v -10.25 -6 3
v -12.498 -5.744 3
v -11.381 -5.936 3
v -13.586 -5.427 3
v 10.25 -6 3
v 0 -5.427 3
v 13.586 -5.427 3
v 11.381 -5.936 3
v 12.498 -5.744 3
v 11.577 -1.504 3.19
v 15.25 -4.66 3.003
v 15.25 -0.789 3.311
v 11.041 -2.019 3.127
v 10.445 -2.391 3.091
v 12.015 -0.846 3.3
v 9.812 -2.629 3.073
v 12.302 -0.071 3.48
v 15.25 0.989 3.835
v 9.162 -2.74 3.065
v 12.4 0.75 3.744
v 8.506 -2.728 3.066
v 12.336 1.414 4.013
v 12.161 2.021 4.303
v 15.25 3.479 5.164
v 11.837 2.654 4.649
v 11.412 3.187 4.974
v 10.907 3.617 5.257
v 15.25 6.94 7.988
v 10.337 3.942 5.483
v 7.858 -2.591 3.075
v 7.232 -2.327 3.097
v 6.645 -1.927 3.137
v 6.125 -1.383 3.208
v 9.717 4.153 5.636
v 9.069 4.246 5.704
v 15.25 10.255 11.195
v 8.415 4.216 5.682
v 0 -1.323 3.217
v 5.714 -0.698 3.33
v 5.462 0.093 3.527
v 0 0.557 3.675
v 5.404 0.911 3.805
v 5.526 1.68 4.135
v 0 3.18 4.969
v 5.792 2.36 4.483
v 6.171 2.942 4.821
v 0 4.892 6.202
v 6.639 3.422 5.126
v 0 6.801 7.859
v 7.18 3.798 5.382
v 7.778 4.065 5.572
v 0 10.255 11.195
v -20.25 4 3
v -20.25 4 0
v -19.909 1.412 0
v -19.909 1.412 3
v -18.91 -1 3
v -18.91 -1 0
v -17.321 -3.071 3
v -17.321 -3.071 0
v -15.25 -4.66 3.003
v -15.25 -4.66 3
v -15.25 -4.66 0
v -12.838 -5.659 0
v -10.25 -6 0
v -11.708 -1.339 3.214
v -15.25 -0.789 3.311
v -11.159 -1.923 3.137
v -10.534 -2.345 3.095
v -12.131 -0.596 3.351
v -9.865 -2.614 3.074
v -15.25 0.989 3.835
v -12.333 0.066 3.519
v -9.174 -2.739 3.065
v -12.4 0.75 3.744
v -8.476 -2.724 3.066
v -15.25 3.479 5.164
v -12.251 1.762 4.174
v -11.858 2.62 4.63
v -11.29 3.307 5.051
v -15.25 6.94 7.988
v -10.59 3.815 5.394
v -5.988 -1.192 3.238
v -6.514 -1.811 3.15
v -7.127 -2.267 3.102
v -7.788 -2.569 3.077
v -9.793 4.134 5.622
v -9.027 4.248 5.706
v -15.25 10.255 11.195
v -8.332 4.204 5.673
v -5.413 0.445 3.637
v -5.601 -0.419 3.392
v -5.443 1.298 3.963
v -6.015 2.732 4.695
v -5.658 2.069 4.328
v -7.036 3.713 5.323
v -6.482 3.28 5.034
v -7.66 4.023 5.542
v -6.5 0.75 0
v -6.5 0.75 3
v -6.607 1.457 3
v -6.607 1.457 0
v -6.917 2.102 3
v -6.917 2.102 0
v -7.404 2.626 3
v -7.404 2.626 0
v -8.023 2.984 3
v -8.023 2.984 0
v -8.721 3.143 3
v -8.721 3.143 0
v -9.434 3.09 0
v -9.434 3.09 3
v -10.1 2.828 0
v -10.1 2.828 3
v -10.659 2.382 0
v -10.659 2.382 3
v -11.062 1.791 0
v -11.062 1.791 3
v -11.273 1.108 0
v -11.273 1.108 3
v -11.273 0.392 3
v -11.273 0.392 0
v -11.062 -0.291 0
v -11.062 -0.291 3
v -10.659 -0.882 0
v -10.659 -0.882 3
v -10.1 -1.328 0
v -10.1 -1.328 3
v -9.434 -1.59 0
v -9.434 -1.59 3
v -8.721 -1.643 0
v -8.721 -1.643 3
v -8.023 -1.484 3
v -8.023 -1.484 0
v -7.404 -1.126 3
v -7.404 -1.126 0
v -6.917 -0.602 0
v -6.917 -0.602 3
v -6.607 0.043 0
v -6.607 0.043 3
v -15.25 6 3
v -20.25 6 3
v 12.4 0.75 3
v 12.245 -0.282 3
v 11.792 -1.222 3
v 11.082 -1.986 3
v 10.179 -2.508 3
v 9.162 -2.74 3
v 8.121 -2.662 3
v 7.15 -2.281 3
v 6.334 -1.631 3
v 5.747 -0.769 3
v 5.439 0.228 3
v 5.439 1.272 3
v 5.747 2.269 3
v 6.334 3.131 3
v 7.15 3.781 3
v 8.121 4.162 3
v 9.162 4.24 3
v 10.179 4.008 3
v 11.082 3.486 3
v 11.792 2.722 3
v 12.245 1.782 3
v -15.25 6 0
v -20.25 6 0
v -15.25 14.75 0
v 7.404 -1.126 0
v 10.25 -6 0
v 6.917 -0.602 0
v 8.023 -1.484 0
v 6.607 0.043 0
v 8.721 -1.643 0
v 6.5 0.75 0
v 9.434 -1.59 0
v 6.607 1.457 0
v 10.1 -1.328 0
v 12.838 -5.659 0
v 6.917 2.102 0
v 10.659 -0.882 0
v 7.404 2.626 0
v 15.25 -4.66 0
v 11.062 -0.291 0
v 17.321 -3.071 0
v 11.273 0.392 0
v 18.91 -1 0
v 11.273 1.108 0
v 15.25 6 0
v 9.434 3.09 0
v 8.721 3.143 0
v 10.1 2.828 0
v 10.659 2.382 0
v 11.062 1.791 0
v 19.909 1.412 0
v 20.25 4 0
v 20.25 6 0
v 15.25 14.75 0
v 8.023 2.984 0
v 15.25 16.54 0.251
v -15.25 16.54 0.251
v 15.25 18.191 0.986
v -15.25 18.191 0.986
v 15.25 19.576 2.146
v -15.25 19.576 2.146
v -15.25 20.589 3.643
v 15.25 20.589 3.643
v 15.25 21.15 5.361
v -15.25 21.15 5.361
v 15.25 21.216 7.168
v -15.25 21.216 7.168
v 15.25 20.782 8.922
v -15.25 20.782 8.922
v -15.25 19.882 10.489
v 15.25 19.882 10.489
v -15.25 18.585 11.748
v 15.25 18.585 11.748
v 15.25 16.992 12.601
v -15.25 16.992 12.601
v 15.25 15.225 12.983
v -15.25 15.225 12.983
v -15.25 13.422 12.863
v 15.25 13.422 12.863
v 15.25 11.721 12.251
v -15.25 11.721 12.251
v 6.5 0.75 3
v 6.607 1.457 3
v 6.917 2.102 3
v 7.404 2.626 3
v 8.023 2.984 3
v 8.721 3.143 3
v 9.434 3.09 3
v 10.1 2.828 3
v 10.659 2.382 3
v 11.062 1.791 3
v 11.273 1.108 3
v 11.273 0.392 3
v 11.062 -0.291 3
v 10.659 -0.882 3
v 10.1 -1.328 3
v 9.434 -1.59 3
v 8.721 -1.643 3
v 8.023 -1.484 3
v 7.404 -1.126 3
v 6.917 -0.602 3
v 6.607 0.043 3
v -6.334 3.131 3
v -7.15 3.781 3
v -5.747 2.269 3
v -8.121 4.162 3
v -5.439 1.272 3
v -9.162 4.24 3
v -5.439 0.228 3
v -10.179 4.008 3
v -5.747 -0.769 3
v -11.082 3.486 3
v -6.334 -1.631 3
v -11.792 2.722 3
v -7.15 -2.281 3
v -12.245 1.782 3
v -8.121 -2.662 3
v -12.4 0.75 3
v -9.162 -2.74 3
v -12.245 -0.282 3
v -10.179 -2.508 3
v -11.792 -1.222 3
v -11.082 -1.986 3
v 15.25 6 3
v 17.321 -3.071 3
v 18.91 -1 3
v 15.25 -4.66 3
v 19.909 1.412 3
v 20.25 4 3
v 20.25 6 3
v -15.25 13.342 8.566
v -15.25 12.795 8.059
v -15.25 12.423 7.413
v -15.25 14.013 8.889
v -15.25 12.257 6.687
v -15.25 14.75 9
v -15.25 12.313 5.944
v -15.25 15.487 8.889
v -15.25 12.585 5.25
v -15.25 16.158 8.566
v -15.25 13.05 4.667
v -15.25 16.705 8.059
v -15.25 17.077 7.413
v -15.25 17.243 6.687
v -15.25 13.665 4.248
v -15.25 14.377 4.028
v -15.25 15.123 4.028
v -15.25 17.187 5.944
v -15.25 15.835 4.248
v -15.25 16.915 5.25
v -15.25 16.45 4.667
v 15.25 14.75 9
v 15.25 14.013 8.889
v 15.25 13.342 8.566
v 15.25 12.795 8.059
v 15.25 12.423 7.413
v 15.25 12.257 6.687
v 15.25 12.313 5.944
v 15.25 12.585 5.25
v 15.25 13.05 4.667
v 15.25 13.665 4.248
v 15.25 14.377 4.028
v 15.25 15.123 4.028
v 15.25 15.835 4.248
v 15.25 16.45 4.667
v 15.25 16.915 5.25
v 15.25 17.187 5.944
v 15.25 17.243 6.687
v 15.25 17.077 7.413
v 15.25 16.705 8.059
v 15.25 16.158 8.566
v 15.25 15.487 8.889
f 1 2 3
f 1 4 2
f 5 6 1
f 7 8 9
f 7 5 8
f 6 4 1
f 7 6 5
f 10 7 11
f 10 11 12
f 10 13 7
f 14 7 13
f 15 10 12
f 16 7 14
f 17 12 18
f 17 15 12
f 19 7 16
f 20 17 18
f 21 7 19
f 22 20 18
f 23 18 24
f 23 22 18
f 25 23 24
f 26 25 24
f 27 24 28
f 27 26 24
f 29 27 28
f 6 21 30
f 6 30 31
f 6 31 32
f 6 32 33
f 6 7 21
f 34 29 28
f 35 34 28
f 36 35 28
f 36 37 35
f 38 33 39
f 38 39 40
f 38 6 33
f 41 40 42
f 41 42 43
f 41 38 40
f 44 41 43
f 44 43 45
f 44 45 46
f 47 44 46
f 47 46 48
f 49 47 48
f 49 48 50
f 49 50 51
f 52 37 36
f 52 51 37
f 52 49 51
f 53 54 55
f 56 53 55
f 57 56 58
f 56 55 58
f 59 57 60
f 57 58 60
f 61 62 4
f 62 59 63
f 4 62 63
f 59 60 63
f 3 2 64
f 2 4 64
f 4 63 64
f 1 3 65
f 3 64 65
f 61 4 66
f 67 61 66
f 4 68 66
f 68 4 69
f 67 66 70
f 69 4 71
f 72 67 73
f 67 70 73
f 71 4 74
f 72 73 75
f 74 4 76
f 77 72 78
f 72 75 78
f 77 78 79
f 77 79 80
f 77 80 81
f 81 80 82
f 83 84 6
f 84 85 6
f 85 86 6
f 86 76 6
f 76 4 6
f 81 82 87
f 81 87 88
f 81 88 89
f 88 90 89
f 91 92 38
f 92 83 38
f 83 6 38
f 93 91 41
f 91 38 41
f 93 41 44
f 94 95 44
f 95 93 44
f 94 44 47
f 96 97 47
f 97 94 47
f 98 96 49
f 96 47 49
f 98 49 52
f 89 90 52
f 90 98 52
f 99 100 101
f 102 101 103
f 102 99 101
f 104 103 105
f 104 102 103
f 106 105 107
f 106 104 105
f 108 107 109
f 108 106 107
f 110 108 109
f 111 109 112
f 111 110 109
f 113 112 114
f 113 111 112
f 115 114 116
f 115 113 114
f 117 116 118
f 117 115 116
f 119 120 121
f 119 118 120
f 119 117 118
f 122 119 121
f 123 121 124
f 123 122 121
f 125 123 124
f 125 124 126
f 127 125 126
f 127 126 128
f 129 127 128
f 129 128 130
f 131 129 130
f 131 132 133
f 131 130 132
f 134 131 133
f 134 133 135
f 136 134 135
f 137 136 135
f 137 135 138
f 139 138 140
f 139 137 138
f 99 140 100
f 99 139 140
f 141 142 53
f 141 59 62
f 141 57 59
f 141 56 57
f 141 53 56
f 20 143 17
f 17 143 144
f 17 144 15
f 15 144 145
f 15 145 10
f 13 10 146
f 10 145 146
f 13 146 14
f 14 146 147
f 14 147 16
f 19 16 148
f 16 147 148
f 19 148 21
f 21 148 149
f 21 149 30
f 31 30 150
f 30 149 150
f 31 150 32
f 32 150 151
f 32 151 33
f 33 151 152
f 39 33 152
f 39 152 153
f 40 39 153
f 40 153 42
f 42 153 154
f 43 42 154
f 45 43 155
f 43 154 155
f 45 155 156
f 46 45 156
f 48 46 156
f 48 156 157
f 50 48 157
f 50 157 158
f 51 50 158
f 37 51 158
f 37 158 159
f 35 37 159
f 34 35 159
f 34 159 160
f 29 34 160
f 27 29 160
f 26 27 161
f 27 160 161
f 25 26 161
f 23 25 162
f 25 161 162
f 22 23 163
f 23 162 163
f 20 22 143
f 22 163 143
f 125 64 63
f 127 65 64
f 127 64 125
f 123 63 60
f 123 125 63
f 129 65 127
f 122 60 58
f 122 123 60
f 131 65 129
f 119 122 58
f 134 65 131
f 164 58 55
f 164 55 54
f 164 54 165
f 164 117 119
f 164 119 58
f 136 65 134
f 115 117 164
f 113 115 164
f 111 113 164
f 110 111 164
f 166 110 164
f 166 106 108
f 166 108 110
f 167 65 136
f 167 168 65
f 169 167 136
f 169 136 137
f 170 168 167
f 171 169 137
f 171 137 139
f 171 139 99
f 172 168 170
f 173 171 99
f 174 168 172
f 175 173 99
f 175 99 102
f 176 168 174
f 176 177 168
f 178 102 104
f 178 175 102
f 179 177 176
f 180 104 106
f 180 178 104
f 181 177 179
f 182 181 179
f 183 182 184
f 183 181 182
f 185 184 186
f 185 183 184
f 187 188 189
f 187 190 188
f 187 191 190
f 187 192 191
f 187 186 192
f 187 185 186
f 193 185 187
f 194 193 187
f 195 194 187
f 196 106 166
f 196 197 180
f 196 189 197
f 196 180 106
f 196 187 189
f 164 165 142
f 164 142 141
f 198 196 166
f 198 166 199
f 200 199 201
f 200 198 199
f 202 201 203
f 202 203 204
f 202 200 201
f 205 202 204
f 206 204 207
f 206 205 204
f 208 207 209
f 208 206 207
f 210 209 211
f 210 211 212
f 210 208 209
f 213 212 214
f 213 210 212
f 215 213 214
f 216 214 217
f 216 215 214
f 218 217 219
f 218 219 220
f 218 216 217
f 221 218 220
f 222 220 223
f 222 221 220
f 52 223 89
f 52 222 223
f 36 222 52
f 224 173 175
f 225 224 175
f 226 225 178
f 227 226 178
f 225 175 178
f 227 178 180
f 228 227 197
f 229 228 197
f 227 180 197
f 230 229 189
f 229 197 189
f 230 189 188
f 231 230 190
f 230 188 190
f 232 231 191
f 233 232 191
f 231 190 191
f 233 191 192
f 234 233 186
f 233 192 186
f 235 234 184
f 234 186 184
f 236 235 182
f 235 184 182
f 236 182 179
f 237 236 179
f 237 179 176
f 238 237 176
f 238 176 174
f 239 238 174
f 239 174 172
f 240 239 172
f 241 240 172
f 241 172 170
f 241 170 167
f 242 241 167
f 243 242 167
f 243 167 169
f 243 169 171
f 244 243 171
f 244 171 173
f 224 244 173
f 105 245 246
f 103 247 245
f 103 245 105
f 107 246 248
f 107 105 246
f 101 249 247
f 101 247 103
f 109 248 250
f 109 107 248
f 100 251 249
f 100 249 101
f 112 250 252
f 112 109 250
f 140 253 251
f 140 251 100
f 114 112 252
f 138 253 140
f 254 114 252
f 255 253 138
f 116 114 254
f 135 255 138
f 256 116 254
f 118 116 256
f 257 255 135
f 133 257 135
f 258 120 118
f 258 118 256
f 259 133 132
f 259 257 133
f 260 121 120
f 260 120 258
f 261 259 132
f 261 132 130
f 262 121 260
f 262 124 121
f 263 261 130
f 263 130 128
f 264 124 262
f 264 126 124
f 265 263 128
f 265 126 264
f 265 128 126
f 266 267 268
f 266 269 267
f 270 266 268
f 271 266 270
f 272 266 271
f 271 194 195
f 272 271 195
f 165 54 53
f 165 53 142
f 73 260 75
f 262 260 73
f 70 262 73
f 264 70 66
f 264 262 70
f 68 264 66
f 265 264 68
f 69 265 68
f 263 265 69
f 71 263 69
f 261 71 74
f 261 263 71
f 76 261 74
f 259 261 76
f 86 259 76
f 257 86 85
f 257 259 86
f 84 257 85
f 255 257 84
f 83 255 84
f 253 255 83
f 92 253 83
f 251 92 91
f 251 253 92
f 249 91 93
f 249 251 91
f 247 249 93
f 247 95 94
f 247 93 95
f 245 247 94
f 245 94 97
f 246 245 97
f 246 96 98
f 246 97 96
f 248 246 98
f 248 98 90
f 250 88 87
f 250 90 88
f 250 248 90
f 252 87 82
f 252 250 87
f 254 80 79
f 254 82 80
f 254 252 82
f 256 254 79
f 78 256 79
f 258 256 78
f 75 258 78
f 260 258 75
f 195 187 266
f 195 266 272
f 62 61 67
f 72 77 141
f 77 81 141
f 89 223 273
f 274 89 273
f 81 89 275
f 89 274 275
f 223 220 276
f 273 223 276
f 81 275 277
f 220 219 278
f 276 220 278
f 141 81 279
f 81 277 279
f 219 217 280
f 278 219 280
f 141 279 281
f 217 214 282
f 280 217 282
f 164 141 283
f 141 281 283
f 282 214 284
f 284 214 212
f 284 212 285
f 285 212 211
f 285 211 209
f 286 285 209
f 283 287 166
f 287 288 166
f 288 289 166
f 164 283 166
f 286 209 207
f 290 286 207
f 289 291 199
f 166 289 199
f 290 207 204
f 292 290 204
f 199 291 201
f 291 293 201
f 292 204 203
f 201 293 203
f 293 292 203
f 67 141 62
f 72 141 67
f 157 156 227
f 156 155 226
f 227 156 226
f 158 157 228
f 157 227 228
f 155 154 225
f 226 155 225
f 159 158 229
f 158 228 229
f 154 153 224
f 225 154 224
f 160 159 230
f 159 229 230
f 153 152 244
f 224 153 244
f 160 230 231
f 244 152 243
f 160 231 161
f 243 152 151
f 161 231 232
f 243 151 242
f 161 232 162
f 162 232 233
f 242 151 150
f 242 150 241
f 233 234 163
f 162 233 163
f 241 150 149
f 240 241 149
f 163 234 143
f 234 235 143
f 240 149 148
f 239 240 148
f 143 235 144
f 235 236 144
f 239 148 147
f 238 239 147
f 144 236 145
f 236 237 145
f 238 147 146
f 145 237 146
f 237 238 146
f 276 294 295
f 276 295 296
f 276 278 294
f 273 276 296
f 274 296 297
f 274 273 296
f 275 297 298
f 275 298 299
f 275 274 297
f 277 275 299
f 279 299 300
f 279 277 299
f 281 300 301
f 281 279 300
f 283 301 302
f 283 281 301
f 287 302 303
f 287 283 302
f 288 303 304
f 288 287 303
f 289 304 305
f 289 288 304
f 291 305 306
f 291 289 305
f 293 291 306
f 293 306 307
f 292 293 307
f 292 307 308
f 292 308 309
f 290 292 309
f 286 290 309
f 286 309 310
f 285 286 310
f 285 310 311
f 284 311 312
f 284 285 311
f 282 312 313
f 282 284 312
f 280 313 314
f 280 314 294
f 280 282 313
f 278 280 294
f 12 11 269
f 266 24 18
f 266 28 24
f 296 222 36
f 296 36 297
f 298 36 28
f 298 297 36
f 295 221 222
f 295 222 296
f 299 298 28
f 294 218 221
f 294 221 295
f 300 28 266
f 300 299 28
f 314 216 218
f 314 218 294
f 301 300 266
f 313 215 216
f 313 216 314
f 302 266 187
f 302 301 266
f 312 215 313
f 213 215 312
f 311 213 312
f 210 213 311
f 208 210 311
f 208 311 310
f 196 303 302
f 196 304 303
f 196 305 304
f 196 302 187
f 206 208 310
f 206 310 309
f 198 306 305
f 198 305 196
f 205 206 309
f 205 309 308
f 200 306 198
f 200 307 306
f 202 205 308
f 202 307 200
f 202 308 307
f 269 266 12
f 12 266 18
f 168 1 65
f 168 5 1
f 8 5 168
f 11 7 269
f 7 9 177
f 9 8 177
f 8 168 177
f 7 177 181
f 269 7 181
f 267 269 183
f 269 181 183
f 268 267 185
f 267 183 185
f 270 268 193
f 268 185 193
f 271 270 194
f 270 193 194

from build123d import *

# Parameters (mm, degrees)
SKETCH_1_W          = 40.5
SKETCH_1_H          = 12
EXTRUDE_1_DEPTH     = 3
SKETCH_2_R          = 2.5
EXTRUDE_2_DEPTH     = 15.25
SKETCH_3_R          = 2.4
CUT_EXTRUDE_1_DEPTH = 30.5
FILLET_1_R          = 10
SKETCH_4_R          = 3.5
CUT_EXTRUDE_2_DEPTH = 30.5


with BuildPart() as part:
    # 草图1 → 凸台-拉伸1 (new body)
    with BuildSketch(Plane.XY):
        Rectangle(SKETCH_1_W, SKETCH_1_H)
    extrude(amount=EXTRUDE_1_DEPTH)

    # 草图2 → 凸台-拉伸2 (add, symmetric)
    with BuildSketch(Plane(origin=(0, 0, 0), x_dir=(0, 0, -1), z_dir=(1, 0, 0))):
        with BuildLine():
            Line((0, -6), (0, 14.75))
            ThreePointArc((0, 14.75), (-8.92202564, 20.78189786), (-11.195012861, 10.25479653))
            add(Edge.make_bspline(
                [(-3, -6), (-3, -3.834699913), (-2.949171736, 2.430786436), (-8.113125227, 7.035920639), (-11.195012861, 10.25479653)],
                knots=[0, 0, 0, 0, 0.319547367, 1, 1, 1, 1], degree=3))
            Line((-3, -6), (0, -6))
        make_face()
        with Locations(Location((-6.5, 14.75, 0), (0, 0, 180))):
            Circle(SKETCH_2_R, mode=Mode.SUBTRACT)
    extrude(amount=EXTRUDE_2_DEPTH, both=True)

    # 草图3 → 切除-拉伸1 (cut)
    with BuildSketch(Plane(origin=(0, 0, 0), x_dir=(-1, 0, 0), z_dir=(0, 0, -1))):
        with Locations((-8.9, 0.75)):
            Circle(SKETCH_3_R)
    cut_extrude_1 = extrude(amount=-CUT_EXTRUDE_1_DEPTH, mode=Mode.SUBTRACT)

    # 镜向1: 切除-拉伸1 across plane
    add(cut_extrude_1.mirror(Plane(origin=(0, 0, 0), x_dir=(0, 0, 1), z_dir=(1, 0, 0))), mode=Mode.SUBTRACT)

    # 圆角1
    # the kernel refuses this fillet: 10 mm, written as the material it takes off along each edge
    with BuildSketch(Plane(origin=(20.25, -6, -25), x_dir=(-1, 0, 0), z_dir=(0, 0, 1)), Plane(origin=(-20.25, -6, -25), x_dir=(0, 1, 0), z_dir=(0, 0, 1))) as fillet_1_piece_1:
        with BuildLine():
            CenterArc((FILLET_1_R, -FILLET_1_R), FILLET_1_R, 90, 90)
            Line((0, -FILLET_1_R), (0, 0))
            Line((0, 0), (FILLET_1_R, 0))
        make_face()
    extrude(amount=53, mode=Mode.SUBTRACT)

    # 草图4 → 切除-拉伸2 (cut)
    with BuildSketch(Plane.XY.offset(3)):
        with Locations(Location((-8.9, 0.75, 0), (0, 0, 180))):
            Circle(SKETCH_4_R)
    cut_extrude_2 = extrude(amount=CUT_EXTRUDE_2_DEPTH, mode=Mode.SUBTRACT)

    # 镜向2: 切除-拉伸2 across plane
    add(cut_extrude_2.mirror(Plane(origin=(0, 0, 0), x_dir=(0, 0, 1), z_dir=(1, 0, 0))), mode=Mode.SUBTRACT)


solid = part.part
